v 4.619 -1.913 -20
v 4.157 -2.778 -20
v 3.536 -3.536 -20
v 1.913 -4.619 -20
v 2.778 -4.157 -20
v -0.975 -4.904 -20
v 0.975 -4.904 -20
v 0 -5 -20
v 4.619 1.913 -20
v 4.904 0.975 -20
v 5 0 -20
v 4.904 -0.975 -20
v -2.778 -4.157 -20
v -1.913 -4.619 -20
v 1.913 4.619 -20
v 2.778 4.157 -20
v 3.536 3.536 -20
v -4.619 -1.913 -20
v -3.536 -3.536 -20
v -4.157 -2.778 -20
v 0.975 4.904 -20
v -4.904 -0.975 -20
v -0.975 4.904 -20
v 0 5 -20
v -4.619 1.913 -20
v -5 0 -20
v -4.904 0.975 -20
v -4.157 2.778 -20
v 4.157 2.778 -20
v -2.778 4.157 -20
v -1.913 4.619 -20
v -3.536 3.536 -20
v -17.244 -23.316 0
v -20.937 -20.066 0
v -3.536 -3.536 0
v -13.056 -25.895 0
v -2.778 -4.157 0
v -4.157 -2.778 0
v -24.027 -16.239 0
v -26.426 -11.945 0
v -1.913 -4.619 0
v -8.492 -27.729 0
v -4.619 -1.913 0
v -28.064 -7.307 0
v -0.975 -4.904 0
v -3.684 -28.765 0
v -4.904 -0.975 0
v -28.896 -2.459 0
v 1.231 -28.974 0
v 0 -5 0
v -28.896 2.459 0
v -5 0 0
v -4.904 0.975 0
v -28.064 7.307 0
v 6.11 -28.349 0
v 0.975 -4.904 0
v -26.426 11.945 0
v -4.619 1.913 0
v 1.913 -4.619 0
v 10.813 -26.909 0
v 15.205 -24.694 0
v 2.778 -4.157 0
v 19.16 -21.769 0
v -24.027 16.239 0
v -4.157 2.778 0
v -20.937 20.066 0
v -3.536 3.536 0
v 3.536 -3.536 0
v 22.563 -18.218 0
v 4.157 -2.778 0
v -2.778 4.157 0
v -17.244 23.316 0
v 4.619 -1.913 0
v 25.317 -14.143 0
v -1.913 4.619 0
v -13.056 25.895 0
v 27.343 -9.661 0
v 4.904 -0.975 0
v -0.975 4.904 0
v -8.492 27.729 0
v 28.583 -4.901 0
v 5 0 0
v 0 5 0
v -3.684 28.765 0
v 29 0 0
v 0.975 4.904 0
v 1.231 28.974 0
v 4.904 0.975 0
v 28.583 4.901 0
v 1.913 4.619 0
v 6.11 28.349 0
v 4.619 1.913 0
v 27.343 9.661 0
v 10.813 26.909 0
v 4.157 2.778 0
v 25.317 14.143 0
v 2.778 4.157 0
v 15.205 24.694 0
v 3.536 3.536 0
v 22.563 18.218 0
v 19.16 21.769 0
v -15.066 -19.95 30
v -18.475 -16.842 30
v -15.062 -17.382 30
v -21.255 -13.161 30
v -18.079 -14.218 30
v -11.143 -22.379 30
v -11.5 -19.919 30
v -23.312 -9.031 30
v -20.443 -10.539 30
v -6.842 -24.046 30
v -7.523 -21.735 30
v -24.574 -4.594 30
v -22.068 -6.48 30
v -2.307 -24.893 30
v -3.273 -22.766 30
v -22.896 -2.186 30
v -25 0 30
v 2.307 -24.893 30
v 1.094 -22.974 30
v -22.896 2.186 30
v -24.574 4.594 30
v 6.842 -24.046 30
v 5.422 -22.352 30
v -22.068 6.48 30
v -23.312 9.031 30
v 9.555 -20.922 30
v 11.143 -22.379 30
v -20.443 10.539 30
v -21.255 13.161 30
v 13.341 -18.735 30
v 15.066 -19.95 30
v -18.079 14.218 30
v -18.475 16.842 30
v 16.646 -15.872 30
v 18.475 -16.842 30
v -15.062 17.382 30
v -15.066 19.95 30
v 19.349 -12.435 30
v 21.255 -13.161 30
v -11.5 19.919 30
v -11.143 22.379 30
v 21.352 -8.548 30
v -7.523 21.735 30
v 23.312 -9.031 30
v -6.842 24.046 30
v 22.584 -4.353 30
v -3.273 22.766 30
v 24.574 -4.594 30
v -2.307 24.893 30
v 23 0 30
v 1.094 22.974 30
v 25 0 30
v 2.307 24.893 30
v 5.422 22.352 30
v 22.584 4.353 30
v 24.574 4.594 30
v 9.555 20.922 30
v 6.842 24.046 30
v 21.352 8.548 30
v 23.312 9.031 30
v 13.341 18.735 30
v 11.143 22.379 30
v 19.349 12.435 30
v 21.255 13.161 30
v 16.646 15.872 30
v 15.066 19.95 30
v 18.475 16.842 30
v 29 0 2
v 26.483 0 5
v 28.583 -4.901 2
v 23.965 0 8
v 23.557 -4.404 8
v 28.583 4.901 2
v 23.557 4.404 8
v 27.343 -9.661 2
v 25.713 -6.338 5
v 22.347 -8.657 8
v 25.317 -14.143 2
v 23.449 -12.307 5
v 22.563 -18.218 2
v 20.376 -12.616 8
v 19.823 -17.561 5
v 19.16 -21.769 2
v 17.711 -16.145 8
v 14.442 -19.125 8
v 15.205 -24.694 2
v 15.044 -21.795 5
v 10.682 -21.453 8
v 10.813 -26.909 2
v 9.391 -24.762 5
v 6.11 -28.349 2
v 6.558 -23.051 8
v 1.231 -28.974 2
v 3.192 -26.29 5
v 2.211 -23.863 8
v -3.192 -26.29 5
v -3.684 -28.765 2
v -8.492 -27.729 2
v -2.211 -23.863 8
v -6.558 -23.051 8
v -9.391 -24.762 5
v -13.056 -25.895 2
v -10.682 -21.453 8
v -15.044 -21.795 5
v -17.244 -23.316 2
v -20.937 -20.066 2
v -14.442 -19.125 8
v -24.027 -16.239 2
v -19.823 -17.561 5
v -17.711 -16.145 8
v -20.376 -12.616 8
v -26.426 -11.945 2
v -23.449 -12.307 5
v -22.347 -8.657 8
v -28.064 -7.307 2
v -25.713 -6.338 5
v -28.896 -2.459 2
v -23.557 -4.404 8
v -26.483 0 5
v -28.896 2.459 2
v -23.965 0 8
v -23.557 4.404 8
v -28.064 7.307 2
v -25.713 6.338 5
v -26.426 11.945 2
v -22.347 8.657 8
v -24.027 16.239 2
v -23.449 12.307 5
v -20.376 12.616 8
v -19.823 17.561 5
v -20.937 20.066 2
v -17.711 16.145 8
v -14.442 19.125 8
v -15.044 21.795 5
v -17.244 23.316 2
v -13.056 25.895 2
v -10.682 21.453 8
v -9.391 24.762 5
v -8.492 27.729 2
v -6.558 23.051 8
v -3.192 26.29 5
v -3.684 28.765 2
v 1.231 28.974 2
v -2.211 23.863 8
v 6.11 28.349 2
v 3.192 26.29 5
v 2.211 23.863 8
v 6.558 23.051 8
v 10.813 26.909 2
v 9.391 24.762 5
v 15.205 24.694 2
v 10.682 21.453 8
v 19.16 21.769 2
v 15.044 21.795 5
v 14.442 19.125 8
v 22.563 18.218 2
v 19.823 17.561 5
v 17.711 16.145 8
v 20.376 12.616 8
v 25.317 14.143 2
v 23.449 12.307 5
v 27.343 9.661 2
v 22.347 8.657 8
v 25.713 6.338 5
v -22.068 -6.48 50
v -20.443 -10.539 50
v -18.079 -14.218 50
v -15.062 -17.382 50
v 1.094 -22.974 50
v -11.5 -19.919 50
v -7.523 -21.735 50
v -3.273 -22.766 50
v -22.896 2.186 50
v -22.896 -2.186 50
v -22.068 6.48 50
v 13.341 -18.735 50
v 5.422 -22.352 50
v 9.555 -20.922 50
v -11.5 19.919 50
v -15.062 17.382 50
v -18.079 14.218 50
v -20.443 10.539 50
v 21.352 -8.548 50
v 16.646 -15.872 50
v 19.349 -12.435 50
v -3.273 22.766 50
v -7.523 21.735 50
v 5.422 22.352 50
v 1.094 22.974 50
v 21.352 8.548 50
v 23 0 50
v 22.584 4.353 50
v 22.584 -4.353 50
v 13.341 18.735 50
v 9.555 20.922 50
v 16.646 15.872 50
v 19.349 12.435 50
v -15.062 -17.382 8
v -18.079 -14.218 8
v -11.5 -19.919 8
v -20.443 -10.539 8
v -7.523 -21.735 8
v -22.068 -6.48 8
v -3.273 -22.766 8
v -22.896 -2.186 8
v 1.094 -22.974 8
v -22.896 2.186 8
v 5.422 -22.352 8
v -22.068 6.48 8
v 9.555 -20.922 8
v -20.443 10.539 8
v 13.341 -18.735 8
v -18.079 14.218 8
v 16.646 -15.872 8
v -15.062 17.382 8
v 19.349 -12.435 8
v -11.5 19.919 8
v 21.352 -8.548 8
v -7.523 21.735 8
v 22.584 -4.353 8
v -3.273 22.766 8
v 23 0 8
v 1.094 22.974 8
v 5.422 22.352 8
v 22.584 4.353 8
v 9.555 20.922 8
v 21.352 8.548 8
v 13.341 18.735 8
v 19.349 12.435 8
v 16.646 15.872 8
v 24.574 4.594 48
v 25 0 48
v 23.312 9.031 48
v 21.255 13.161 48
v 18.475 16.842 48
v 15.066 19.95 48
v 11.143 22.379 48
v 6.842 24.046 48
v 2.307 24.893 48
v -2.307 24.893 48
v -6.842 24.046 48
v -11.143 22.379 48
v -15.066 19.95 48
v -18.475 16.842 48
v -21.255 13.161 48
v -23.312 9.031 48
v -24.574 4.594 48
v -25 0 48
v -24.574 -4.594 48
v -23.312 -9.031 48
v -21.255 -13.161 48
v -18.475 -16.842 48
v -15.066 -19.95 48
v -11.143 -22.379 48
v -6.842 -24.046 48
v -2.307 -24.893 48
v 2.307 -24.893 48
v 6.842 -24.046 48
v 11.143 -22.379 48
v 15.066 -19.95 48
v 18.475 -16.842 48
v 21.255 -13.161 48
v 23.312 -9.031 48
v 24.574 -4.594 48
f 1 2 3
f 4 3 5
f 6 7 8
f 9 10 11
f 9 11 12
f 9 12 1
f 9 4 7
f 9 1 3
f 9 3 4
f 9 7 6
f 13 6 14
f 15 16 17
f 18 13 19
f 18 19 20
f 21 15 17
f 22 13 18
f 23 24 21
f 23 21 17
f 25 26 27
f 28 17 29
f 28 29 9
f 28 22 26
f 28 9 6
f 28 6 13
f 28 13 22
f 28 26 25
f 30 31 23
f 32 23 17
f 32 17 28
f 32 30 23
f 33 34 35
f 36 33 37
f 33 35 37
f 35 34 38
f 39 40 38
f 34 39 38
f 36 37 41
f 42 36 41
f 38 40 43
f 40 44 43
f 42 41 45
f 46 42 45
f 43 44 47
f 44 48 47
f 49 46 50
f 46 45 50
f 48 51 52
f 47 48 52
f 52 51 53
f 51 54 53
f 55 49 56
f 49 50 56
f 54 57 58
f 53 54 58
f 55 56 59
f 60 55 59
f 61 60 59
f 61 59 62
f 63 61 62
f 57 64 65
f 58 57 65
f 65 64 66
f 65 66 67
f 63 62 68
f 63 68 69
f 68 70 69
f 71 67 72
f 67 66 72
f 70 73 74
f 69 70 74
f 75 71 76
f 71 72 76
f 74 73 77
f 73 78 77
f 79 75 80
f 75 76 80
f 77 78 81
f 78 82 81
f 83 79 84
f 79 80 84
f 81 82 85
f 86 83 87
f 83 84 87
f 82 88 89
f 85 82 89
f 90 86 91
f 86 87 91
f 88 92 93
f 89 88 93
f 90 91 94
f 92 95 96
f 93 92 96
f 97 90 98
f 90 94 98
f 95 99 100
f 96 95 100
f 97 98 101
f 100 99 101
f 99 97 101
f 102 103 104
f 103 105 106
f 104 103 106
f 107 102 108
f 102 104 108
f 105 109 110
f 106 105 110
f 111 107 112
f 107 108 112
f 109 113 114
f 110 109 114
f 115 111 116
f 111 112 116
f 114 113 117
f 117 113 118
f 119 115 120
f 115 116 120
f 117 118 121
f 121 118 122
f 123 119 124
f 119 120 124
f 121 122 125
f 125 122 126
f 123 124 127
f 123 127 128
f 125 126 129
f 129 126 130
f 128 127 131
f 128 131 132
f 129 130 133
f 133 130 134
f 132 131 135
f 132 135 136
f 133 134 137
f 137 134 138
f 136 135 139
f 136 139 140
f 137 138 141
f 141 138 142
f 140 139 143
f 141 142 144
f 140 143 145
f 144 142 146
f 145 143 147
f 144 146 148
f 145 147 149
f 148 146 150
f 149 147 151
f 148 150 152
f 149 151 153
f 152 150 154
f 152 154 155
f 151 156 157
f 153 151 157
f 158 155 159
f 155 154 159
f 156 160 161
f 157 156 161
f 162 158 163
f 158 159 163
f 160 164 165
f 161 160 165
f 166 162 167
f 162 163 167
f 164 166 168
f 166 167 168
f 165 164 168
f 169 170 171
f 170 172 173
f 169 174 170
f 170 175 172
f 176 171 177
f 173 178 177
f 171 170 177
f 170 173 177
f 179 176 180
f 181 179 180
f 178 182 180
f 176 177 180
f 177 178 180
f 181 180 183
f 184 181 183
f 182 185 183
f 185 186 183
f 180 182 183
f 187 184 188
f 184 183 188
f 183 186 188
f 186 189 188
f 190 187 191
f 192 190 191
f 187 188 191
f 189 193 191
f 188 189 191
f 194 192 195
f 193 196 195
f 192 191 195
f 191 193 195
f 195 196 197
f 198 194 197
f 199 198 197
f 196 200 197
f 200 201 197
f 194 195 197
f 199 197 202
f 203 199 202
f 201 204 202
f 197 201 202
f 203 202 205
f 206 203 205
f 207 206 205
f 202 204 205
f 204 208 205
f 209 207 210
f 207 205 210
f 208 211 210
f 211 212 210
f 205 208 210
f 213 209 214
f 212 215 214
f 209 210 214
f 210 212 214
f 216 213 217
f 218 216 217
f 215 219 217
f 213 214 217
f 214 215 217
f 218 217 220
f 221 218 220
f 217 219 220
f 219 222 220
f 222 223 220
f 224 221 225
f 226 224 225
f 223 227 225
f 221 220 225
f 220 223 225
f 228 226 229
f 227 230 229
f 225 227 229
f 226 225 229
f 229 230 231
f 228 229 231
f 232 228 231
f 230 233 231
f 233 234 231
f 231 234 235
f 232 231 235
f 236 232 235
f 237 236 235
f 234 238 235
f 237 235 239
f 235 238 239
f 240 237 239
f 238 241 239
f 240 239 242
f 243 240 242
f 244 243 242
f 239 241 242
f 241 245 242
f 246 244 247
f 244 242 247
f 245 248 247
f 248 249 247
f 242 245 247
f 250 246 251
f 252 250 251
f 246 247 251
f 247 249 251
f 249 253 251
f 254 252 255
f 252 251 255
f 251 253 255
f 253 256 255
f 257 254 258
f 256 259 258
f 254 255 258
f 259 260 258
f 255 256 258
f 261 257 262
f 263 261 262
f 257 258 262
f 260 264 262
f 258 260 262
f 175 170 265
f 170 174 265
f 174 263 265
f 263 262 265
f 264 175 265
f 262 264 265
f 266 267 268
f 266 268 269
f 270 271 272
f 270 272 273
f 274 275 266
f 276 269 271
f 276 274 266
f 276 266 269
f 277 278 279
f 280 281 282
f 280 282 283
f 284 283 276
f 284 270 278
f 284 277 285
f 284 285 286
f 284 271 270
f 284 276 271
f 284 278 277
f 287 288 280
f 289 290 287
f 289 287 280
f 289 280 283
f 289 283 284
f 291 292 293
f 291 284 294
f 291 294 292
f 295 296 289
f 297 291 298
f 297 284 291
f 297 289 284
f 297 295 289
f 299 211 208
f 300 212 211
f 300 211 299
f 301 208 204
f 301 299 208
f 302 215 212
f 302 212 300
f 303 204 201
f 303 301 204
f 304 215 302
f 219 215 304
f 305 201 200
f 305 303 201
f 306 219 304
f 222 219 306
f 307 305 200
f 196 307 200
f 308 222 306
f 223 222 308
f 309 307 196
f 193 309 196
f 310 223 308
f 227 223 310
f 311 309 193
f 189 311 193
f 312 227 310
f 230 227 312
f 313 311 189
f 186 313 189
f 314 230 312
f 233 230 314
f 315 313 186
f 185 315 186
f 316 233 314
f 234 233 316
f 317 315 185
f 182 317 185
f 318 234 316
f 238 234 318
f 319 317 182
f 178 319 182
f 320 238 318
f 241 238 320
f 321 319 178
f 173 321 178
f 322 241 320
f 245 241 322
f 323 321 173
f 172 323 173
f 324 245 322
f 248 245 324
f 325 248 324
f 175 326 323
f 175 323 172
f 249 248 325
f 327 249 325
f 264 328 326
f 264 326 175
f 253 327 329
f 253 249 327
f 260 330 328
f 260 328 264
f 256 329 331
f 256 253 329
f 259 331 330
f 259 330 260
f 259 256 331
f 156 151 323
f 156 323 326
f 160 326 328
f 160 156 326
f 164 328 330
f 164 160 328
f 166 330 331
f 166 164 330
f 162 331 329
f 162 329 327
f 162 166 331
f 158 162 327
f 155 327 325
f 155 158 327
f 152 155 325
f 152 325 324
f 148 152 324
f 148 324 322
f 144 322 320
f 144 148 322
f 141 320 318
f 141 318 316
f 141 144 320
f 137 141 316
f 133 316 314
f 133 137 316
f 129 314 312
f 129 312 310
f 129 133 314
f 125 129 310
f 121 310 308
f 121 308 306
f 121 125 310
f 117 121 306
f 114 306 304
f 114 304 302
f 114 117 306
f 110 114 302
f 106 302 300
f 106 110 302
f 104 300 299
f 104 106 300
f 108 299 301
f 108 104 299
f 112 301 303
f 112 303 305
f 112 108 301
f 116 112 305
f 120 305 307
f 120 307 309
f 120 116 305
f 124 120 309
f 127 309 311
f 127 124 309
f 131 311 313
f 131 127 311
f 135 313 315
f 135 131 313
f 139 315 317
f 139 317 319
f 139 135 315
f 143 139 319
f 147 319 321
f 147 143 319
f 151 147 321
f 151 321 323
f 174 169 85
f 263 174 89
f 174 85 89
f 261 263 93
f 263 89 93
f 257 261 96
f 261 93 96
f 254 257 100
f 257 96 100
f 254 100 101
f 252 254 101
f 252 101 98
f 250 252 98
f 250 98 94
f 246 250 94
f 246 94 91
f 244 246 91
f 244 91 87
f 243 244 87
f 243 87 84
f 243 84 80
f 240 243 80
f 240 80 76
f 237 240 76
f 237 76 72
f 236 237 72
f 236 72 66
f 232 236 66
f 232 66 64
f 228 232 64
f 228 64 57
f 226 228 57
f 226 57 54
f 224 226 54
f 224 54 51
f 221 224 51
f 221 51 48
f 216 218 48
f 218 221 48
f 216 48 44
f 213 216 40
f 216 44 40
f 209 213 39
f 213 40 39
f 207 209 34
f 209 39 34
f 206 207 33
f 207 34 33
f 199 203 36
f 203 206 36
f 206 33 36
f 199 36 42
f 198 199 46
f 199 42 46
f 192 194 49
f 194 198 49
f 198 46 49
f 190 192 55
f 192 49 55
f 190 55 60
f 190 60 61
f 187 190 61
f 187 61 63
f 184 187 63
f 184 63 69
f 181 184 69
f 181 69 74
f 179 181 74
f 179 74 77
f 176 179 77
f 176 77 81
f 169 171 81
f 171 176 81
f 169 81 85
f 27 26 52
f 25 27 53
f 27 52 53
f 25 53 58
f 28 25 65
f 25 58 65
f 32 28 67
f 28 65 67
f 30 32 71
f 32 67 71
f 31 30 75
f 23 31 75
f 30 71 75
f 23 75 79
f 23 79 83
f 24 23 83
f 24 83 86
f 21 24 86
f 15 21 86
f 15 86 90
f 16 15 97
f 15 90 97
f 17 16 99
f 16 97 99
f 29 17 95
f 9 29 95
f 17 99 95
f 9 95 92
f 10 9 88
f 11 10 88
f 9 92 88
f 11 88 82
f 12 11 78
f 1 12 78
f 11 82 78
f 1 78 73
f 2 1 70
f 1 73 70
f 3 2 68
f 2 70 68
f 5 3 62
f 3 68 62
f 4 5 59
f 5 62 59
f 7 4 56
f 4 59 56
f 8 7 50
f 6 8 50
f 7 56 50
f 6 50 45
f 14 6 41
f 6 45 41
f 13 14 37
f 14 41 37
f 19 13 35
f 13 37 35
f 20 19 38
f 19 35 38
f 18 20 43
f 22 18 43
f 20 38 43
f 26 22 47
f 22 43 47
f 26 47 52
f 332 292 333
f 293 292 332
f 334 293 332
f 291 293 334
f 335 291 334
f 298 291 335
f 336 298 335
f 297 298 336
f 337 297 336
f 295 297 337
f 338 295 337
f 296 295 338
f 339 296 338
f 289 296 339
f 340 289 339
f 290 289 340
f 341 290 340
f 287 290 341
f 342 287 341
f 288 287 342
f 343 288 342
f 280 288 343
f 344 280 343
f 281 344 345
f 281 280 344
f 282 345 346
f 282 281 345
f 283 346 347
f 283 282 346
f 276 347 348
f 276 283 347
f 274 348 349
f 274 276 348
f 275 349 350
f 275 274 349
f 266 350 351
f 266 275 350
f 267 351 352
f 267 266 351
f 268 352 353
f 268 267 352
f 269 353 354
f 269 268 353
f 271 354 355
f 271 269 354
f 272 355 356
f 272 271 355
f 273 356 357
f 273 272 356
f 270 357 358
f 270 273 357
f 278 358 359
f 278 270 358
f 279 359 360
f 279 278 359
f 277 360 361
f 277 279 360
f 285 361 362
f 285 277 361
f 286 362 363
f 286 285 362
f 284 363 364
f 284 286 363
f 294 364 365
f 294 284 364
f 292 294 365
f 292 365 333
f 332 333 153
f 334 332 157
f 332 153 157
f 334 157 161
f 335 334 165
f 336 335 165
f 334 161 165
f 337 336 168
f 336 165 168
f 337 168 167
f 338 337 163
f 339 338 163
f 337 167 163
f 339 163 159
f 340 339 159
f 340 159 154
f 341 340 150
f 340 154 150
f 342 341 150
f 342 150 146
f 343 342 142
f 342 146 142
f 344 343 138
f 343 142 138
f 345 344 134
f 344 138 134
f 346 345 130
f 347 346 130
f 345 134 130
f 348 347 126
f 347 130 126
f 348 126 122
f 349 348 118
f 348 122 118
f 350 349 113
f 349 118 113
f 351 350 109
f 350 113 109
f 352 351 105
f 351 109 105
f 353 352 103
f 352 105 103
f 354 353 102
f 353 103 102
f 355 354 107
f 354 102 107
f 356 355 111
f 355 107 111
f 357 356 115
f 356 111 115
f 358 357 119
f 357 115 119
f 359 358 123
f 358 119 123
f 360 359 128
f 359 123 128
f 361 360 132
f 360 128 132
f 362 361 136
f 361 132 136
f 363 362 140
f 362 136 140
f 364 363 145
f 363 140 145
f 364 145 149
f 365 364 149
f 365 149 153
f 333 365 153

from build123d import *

# Parameters (mm, degrees)
SKETCH1_R           = 29
BOSS_EXTRUDE1_DEPTH = 30
SKETCH2_OUTSIDE_W   = 77.468
SKETCH2_OUTSIDE_H   = 77.468
SKETCH2_OUTSIDE_R   = 23
CUT_EXTRUDE1_DEPTH  = 22
CHAMFER1_SIZE       = 6
CHAMFER1_SIZE2      = 5.034597787
SKETCH3_R           = 25
BOSS_EXTRUDE2_DEPTH = 20
SKETCH4_R           = 5
BOSS_EXTRUDE3_DEPTH = 20
CHAMFER2_SIZE       = 2


with BuildPart() as part:
    # Sketch1 → Boss-Extrude1 (new body)
    with BuildSketch(Plane.XY):
        Circle(SKETCH1_R)
    extrude(amount=BOSS_EXTRUDE1_DEPTH)

    # Sketch2 outside → Cut-Extrude1 (cut)
    with BuildSketch(Plane.XY.offset(30)):
        Rectangle(SKETCH2_OUTSIDE_W, SKETCH2_OUTSIDE_H)
        Circle(SKETCH2_OUTSIDE_R, mode=Mode.SUBTRACT)
    extrude(amount=-CUT_EXTRUDE1_DEPTH, mode=Mode.SUBTRACT)

    # Chamfer1
    chamfer1_edges = [part.edges().sort_by_distance(p)[0] for p in [
        (-29, 0, 8),
    ]]
    chamfer1_side = [part.faces().sort_by_distance(p)[0] for p in [
        (-29, 0, 4),
    ]]
    chamfer(chamfer1_edges, length=CHAMFER1_SIZE, length2=CHAMFER1_SIZE2, reference=chamfer1_side[0])

    # Sketch3 → Boss-Extrude2 (add)
    with BuildSketch(Plane.XY.offset(30)):
        Circle(SKETCH3_R)
    extrude(amount=BOSS_EXTRUDE2_DEPTH)

    # Sketch4 → Boss-Extrude3 (add)
    with BuildSketch(Plane(origin=(0, 0, 0), x_dir=(-1, 0, 0), z_dir=(0, 0, -1))):
        Circle(SKETCH4_R)
    extrude(amount=BOSS_EXTRUDE3_DEPTH)

    # Chamfer2
    chamfer2_edges = [part.edges().sort_by_distance(p)[0] for p in [
        (-25, 0, 50),
    ]]
    chamfer(chamfer2_edges, length=CHAMFER2_SIZE)


solid = part.part
